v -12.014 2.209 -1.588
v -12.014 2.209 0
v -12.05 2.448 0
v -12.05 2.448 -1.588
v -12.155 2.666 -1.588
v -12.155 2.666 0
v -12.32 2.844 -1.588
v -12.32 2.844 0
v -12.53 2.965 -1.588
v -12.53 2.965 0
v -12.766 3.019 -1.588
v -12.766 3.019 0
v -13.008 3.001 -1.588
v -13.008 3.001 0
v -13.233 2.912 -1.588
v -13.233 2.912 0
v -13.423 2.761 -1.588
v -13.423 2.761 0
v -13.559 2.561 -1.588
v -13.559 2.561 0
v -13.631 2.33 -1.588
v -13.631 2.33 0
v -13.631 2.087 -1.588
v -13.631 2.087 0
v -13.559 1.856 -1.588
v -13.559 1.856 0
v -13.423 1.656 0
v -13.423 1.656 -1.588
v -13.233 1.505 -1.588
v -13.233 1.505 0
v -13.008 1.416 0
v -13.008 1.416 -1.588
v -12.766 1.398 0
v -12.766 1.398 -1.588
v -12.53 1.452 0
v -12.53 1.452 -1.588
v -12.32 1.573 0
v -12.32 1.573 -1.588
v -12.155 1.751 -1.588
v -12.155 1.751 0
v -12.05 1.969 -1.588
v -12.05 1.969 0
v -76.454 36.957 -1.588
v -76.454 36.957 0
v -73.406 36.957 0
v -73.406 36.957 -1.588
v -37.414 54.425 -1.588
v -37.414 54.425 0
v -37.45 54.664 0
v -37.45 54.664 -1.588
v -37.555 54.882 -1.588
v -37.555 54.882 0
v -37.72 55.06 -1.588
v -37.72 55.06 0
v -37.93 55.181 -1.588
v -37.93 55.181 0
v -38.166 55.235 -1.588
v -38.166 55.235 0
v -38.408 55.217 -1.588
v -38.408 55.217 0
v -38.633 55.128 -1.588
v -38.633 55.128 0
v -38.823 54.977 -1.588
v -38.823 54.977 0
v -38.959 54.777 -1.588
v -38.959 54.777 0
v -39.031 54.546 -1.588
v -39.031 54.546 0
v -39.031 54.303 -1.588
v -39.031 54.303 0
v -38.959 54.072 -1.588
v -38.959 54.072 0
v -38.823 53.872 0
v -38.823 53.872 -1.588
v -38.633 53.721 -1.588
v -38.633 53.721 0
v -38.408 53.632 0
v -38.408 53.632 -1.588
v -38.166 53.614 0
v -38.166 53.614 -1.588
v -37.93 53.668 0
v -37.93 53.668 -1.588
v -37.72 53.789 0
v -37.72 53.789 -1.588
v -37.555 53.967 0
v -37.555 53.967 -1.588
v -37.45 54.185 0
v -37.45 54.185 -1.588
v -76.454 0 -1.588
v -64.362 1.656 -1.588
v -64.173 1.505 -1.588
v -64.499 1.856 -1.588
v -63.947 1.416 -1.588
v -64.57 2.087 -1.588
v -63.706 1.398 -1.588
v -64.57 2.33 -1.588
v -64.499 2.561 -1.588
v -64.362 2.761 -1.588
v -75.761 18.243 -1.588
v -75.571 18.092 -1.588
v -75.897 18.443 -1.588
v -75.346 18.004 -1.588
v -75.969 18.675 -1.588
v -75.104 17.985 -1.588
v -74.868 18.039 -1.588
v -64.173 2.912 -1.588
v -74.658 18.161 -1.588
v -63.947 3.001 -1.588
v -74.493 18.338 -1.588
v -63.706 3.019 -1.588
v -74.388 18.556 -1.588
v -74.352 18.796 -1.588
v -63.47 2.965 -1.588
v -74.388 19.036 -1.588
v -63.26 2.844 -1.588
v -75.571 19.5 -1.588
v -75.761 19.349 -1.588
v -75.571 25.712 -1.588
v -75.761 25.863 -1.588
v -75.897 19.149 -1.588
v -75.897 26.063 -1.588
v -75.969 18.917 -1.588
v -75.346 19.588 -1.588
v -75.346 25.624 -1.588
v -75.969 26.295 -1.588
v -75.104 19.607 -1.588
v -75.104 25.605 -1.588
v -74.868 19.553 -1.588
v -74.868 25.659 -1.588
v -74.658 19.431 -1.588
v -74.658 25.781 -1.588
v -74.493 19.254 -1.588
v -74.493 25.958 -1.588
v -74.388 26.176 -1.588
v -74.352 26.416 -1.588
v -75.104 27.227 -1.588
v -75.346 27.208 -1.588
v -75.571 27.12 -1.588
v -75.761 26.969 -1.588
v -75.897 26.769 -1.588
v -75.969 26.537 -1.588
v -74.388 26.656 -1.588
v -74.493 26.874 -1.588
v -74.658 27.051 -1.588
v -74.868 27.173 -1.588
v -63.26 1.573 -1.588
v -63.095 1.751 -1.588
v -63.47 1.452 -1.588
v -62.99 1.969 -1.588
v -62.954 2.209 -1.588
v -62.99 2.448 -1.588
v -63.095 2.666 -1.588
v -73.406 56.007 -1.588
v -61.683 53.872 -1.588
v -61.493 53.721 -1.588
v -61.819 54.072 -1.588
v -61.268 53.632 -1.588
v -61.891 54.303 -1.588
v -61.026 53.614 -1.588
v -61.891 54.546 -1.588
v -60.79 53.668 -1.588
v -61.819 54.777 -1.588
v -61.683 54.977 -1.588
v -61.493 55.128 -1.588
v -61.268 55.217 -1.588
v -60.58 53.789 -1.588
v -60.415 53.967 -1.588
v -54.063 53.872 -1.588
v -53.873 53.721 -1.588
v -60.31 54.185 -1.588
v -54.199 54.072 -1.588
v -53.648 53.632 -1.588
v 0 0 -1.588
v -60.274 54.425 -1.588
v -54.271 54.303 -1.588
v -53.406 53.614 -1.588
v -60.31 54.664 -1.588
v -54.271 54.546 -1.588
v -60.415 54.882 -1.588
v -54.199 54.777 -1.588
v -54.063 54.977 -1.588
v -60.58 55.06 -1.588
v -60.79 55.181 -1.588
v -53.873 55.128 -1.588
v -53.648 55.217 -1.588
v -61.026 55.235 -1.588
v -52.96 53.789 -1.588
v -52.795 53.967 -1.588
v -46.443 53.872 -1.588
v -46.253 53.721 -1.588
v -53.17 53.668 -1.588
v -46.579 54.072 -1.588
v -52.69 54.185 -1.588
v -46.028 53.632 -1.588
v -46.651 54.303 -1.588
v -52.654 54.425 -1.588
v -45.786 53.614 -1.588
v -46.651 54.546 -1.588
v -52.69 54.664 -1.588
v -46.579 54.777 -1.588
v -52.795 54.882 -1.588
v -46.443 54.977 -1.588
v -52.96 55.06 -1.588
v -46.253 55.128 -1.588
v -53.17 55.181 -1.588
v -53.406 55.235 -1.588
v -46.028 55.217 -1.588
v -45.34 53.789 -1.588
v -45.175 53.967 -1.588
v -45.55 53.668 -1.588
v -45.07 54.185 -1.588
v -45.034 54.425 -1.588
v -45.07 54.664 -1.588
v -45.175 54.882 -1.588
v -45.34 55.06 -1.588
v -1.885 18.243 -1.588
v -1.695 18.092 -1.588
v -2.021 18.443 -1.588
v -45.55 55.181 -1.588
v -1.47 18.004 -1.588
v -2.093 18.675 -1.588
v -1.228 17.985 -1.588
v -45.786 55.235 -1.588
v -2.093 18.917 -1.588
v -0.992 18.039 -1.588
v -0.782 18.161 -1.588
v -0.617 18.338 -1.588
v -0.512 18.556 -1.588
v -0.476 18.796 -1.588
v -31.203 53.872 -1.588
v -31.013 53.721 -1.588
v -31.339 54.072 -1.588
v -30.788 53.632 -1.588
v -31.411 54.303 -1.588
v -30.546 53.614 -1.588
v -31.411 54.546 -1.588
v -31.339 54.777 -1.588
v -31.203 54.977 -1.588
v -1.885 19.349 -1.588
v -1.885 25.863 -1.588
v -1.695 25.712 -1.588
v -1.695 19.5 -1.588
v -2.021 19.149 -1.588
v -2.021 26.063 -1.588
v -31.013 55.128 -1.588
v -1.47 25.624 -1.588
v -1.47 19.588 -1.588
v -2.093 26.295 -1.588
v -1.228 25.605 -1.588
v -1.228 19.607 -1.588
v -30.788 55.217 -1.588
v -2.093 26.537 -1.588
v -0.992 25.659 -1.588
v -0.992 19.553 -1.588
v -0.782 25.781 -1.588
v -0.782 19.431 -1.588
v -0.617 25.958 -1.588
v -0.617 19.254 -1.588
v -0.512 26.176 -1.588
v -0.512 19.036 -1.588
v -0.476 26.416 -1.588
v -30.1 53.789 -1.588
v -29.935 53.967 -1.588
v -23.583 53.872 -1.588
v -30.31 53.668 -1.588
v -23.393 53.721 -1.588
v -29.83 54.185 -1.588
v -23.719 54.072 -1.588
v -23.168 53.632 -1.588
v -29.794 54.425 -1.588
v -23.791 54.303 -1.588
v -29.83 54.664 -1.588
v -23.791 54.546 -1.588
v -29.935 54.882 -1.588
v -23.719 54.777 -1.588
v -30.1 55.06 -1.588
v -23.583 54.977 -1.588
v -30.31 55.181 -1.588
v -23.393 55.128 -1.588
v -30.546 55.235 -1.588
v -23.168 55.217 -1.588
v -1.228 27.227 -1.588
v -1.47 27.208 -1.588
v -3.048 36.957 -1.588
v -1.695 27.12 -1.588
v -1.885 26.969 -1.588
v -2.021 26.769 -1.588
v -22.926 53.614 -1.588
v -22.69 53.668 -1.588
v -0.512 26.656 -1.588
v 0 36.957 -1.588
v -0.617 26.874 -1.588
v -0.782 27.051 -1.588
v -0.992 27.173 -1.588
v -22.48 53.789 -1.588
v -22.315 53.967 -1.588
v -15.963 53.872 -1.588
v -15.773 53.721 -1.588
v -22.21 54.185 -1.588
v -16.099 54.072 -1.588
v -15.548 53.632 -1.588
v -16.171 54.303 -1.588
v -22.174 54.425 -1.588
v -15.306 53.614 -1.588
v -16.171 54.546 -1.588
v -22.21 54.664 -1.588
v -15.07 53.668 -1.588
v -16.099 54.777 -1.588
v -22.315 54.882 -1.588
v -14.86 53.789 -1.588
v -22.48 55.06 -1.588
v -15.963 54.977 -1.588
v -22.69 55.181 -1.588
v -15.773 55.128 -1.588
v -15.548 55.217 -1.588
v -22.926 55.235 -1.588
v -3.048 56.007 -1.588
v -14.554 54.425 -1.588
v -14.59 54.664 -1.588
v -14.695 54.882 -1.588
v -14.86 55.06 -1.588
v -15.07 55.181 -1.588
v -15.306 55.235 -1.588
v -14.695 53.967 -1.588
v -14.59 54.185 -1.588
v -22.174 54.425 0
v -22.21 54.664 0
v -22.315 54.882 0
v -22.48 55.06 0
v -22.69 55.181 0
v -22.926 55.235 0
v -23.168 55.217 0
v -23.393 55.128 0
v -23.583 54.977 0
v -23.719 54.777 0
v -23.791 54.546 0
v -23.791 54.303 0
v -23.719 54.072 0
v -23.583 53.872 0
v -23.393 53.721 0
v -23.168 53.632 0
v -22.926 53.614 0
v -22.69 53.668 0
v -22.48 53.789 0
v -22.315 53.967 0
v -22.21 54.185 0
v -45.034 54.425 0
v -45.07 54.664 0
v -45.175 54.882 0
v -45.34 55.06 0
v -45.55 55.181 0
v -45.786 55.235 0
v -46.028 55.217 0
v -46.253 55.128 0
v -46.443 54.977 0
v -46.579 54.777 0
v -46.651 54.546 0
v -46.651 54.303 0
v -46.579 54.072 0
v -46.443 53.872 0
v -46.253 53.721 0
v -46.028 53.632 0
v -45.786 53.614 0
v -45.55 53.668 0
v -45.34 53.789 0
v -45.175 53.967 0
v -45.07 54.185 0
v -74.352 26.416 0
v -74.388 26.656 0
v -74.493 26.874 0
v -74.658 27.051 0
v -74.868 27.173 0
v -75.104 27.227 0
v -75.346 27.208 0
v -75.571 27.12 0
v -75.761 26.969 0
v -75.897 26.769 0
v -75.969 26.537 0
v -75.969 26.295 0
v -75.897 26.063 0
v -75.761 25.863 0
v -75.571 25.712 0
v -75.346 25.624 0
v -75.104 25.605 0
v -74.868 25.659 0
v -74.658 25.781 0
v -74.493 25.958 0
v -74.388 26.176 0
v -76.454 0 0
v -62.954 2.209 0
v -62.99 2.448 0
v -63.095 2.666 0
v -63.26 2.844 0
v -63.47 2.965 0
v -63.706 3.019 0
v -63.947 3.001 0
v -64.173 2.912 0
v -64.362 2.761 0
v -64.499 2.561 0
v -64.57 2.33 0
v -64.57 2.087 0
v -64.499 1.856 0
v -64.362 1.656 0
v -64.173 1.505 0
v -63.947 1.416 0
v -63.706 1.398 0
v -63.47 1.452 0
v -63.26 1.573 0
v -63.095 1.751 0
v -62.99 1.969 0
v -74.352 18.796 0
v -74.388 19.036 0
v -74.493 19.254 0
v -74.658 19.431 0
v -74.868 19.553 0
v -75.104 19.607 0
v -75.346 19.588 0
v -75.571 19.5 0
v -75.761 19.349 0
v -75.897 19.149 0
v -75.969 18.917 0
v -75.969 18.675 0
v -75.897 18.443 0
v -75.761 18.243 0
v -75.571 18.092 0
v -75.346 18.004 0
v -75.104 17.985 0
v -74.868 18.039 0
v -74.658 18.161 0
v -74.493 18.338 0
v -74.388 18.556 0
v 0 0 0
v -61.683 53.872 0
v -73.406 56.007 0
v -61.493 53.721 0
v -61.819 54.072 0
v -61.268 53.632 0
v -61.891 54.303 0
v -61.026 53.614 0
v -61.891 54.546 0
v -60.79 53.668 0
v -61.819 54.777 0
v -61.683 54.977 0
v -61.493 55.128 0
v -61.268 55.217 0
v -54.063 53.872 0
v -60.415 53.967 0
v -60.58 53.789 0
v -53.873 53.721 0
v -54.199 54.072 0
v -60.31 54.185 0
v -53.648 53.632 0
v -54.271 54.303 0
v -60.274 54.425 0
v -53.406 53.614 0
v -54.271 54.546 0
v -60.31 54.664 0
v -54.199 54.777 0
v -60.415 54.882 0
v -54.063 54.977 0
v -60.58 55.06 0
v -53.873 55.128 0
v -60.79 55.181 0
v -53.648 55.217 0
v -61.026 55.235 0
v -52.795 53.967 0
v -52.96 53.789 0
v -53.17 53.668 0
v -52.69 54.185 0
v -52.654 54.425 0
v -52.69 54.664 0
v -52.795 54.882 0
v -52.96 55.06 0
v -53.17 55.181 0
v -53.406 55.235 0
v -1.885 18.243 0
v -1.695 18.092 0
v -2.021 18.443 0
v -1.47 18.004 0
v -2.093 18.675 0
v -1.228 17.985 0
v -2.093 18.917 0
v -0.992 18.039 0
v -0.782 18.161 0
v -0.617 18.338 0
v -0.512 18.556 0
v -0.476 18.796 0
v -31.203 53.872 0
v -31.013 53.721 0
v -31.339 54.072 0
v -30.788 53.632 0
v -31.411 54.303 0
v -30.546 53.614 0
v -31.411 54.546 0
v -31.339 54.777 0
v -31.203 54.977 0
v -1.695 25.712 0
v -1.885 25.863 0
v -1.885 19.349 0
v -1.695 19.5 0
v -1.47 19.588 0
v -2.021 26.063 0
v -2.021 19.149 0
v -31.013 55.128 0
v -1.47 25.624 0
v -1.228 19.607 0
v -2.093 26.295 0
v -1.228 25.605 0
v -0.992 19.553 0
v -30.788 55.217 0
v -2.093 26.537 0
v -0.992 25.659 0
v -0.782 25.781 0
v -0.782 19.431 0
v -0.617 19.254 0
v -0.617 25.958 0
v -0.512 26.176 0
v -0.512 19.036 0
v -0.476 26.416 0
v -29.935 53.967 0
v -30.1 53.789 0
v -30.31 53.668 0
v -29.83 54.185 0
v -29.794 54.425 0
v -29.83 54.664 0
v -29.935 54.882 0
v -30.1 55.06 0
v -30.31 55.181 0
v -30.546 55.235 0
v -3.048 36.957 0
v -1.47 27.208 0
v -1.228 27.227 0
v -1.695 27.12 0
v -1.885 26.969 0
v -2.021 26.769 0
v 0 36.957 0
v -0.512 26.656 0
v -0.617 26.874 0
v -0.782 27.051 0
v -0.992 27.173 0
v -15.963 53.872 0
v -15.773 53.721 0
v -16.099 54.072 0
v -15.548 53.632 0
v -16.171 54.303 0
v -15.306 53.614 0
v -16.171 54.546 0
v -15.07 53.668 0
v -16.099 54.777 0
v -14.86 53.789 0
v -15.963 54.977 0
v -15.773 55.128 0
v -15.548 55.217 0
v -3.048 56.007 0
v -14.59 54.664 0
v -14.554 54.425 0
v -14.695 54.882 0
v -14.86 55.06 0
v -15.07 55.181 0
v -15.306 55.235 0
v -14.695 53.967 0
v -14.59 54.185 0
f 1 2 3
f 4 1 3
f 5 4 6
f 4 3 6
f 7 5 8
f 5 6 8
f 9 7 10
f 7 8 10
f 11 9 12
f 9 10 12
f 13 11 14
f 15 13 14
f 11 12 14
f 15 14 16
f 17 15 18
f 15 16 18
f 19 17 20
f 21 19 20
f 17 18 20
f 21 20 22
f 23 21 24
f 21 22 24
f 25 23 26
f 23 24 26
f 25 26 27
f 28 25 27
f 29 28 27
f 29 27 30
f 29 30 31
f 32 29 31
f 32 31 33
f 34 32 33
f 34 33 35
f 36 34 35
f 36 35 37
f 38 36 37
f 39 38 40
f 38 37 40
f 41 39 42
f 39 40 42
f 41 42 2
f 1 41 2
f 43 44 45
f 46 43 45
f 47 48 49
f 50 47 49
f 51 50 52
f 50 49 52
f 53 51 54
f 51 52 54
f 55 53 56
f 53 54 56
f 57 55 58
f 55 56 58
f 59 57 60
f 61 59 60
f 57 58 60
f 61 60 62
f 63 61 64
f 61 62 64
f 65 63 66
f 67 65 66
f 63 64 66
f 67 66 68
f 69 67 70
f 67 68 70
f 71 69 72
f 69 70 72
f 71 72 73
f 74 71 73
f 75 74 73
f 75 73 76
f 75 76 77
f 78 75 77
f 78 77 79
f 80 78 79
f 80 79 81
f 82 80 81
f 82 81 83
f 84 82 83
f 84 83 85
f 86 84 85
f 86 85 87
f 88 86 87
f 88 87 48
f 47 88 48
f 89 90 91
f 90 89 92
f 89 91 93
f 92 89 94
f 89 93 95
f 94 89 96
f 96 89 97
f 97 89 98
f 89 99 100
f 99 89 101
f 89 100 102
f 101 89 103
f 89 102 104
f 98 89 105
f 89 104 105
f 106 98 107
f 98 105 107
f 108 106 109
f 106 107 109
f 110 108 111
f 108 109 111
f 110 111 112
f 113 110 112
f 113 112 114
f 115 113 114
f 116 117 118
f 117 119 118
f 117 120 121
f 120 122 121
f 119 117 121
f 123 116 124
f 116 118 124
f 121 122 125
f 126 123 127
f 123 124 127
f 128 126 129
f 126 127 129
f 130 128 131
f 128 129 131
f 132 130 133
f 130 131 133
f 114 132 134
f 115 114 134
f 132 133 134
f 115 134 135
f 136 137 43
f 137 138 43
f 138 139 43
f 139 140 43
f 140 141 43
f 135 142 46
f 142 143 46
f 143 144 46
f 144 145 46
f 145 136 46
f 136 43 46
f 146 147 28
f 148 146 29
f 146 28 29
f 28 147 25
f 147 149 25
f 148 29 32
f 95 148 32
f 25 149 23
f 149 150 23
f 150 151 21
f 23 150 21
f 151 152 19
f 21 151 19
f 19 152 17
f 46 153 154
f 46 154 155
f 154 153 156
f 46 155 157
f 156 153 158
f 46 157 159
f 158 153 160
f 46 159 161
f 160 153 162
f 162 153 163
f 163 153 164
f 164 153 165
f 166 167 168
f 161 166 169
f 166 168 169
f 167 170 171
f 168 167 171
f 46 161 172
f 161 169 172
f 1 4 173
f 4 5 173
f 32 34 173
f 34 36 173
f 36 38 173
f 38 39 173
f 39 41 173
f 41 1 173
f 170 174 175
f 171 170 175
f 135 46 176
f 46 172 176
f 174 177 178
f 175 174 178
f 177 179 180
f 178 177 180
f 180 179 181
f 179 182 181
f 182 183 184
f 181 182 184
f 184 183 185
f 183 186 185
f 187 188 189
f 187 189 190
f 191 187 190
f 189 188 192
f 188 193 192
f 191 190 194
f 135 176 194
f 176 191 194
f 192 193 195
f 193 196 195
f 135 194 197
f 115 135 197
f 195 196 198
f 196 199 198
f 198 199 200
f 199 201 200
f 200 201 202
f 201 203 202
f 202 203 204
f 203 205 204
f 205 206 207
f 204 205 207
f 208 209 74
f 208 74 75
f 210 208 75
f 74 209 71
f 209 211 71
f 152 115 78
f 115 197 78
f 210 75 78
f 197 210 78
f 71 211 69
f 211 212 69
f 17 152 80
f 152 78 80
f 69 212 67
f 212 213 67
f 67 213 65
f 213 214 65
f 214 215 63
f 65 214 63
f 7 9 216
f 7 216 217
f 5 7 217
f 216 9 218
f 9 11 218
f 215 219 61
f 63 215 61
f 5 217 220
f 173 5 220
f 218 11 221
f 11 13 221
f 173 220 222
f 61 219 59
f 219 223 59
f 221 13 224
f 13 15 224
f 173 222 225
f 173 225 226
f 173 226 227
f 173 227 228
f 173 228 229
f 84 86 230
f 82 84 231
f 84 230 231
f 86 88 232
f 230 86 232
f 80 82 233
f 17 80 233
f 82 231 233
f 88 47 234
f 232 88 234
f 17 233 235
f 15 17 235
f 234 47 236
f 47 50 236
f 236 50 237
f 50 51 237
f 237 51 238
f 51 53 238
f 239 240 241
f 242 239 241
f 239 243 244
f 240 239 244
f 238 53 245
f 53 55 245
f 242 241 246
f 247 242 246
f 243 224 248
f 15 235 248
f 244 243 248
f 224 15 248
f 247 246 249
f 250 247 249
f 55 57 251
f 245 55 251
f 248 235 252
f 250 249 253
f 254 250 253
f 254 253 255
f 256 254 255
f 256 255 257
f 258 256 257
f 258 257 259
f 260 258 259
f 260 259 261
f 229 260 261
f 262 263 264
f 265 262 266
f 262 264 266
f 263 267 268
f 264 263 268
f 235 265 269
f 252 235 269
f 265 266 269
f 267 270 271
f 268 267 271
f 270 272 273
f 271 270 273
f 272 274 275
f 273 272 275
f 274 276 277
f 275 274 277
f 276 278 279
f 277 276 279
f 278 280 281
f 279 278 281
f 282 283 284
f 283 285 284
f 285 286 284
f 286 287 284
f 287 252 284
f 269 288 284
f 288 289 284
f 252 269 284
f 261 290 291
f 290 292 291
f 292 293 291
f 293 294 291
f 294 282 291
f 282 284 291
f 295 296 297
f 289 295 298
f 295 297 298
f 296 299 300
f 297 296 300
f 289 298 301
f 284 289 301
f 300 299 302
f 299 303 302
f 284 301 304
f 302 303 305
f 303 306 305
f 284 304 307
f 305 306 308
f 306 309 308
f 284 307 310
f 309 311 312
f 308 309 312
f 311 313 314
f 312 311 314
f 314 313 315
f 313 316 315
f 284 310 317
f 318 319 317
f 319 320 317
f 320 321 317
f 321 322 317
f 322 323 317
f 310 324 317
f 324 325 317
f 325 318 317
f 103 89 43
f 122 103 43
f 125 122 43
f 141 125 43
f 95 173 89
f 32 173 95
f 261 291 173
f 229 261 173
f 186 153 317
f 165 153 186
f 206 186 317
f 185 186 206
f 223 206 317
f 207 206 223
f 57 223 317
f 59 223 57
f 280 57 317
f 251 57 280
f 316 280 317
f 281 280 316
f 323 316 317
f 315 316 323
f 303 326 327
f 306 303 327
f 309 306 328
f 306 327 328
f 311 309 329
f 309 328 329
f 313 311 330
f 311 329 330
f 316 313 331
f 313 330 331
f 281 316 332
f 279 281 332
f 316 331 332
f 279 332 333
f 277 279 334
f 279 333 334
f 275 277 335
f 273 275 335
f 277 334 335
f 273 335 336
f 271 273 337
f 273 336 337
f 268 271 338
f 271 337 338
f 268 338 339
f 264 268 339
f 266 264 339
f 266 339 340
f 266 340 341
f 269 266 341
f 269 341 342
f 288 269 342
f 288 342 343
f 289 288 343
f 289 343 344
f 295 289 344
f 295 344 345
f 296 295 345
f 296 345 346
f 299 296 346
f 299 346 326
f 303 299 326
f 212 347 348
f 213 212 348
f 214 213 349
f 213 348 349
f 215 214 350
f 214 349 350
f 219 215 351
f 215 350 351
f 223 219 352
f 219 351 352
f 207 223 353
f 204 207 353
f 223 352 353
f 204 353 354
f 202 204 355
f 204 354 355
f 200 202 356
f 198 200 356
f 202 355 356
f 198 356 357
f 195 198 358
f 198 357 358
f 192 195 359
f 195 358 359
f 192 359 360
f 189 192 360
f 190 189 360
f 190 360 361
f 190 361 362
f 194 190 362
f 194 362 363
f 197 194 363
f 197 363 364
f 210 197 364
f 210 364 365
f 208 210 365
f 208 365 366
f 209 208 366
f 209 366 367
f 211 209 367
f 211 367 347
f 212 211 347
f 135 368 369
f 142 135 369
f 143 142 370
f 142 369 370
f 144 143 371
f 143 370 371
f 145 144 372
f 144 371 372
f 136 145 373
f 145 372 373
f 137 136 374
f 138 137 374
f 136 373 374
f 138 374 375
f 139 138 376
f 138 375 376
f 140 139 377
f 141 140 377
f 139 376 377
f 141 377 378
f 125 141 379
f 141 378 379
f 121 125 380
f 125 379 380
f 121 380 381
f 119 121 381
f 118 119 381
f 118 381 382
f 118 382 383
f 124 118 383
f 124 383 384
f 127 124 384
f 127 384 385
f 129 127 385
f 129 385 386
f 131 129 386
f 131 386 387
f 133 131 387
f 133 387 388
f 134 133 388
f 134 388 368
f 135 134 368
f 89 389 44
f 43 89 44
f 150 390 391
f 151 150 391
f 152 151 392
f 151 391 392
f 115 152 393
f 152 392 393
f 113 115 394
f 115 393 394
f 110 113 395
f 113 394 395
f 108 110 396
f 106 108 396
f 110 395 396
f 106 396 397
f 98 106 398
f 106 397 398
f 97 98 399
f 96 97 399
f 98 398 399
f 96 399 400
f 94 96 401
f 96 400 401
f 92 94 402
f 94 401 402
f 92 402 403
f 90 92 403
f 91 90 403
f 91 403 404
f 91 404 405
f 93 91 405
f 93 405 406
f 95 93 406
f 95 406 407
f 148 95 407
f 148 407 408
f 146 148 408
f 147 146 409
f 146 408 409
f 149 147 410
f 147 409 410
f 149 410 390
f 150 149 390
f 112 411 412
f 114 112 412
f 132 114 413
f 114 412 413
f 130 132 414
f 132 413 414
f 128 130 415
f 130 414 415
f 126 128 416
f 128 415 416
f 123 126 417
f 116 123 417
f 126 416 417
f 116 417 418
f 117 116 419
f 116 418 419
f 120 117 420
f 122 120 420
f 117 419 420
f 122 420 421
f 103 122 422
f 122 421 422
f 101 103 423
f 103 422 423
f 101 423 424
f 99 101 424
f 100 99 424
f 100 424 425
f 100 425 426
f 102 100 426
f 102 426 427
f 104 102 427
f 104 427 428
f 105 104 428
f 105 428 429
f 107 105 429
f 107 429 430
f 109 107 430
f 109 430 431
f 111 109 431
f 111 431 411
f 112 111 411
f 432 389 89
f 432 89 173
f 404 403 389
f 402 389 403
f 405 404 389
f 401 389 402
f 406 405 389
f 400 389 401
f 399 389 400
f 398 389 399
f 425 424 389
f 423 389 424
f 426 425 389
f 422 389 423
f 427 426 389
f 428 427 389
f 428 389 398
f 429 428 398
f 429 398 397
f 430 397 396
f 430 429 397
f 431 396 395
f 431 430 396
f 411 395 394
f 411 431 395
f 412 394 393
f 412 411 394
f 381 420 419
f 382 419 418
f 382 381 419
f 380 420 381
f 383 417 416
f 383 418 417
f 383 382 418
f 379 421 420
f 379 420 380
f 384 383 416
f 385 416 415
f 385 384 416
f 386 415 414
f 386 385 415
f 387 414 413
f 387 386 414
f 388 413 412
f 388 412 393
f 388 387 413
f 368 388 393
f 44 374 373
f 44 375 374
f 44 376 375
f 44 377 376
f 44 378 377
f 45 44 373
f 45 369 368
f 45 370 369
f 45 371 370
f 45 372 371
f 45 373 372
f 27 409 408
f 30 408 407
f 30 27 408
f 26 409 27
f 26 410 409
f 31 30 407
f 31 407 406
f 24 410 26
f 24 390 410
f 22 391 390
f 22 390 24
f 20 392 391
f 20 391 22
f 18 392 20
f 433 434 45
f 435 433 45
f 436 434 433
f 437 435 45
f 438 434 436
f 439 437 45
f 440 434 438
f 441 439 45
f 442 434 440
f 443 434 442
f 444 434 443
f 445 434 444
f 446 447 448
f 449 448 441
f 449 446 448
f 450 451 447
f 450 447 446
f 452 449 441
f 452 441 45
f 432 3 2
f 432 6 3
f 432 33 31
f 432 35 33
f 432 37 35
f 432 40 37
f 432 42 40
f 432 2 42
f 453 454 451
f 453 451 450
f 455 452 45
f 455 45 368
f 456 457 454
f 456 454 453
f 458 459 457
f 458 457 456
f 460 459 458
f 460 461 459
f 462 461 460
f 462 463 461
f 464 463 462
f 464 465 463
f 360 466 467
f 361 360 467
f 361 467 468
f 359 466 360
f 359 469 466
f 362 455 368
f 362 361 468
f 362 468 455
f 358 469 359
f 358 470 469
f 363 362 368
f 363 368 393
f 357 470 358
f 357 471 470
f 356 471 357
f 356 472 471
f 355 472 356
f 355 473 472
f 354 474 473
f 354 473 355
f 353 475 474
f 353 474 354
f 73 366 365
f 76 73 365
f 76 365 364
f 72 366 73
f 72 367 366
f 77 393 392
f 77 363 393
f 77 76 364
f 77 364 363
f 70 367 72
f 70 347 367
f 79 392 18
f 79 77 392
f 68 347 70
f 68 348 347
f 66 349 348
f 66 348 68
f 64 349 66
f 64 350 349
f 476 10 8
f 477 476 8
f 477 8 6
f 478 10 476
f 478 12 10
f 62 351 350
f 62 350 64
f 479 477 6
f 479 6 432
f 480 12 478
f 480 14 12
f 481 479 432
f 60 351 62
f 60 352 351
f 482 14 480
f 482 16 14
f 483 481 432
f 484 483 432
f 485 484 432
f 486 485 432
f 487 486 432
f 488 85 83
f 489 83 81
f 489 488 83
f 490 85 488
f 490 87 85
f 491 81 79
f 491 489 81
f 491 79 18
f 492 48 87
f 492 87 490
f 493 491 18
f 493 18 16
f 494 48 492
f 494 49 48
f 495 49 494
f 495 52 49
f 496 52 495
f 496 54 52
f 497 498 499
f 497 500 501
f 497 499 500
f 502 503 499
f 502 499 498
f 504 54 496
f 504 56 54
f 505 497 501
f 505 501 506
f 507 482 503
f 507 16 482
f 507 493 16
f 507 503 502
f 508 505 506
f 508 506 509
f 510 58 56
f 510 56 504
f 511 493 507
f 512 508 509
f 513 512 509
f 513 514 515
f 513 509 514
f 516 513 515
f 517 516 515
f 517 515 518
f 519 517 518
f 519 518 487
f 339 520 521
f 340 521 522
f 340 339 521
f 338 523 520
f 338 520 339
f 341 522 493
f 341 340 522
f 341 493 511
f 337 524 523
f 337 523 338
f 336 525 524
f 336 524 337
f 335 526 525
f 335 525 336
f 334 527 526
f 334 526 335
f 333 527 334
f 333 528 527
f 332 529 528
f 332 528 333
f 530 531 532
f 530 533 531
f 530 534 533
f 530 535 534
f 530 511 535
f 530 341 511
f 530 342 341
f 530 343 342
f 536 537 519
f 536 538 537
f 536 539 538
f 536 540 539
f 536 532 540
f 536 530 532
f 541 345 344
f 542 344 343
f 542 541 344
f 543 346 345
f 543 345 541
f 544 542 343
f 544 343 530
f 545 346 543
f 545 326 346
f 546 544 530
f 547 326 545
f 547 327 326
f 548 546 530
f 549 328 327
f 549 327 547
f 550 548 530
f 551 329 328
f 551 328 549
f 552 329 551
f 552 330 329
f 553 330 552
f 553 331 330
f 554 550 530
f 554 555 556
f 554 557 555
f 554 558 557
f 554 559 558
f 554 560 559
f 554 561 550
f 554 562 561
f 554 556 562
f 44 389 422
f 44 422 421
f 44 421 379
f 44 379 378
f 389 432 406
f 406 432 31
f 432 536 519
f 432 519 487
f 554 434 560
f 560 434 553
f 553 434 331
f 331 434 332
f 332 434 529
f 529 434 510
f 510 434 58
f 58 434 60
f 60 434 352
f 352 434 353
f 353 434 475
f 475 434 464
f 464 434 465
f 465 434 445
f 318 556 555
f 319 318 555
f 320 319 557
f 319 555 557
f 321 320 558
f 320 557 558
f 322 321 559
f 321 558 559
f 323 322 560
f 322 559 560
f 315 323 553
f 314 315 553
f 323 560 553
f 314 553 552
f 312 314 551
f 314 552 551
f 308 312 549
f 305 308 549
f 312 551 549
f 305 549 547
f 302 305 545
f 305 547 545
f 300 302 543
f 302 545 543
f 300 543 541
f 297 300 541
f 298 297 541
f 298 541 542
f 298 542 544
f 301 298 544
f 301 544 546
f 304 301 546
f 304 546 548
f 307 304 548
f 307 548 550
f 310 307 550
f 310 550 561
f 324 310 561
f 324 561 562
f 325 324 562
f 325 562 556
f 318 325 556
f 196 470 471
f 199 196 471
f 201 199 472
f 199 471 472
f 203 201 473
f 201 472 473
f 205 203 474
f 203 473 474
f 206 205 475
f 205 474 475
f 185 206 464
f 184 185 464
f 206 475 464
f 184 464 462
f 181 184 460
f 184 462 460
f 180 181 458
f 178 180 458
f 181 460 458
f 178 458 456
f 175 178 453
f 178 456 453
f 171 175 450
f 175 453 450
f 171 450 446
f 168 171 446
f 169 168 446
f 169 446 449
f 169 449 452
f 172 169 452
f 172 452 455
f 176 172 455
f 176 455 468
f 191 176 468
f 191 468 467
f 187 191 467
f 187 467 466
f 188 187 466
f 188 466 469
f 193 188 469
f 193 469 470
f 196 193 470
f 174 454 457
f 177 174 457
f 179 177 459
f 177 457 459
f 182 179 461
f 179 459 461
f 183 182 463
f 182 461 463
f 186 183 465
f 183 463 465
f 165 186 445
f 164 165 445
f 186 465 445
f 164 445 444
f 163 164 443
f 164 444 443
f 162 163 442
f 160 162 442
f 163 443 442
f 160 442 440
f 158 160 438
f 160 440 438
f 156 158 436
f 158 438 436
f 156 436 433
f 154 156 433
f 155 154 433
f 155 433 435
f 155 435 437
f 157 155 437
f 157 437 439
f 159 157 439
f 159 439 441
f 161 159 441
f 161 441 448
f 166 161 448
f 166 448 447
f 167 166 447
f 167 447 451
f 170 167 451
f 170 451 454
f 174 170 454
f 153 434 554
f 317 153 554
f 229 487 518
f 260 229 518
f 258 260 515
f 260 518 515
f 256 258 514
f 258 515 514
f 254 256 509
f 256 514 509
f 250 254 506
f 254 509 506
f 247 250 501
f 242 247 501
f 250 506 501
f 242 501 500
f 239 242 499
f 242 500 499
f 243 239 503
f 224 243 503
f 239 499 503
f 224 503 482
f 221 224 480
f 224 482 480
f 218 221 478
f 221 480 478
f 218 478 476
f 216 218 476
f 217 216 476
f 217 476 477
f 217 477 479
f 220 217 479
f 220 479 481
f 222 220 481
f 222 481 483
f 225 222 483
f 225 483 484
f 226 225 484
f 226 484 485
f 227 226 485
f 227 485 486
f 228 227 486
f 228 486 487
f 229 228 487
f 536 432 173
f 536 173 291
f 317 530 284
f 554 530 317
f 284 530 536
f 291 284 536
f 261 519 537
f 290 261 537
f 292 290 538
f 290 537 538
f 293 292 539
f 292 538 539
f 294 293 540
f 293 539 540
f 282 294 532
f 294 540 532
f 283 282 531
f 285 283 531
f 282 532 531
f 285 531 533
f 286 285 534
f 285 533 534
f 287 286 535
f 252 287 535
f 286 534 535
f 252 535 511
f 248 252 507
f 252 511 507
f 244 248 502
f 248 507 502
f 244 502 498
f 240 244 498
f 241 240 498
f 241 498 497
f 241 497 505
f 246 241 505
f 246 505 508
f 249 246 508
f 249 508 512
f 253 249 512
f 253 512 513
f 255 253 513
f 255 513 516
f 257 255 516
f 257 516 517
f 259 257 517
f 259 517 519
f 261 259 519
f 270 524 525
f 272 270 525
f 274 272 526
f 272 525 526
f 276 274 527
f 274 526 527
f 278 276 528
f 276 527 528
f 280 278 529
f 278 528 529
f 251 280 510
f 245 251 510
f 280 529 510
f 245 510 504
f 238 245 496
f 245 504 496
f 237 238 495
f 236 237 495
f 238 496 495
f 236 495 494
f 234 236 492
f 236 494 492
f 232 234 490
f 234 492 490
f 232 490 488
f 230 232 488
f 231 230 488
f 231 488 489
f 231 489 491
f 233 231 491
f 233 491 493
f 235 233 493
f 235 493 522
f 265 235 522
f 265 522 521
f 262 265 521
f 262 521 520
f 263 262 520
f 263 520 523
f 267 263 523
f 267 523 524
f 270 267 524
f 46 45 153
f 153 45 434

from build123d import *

# Parameters (mm, degrees)
SKETCH1_W          = 76.454
SKETCH1_H          = 56.007
EXTRUDE1_DEPTH     = 1.5875
SKETCH2_R          = 0.8128
EXTRUDE2_DEPTH     = 95.786699073
SKETCH4_R          = 0.8128
EXTRUDE3_DEPTH     = 9.525
SKETCH5_W          = 3.048
SKETCH5_H          = 19.05
EXTRUDE4_DEPTH     = 95.786699073
SKETCH6_R          = 0.8128
CUT_EXTRUDE1_DEPTH = 1.5875


with BuildPart() as part:
    # Sketch1 → Extrude1 (new body)
    with BuildSketch(Plane.XY):
        with Locations((-38.227, 28.0035)):
            Rectangle(SKETCH1_W, SKETCH1_H)
    extrude(amount=-EXTRUDE1_DEPTH)

    # Sketch2 → Extrude2 (cut, through all)
    with BuildSketch(Plane.XY):
        with Locations((-38.227, 54.42458)):
            Circle(SKETCH2_R)
        with Locations((-30.607, 54.42458)):
            Circle(SKETCH2_R)
        with Locations((-22.987, 54.42458)):
            Circle(SKETCH2_R)
        with Locations((-15.367, 54.42458)):
            Circle(SKETCH2_R)
        with Locations((-45.847, 54.42458)):
            Circle(SKETCH2_R)
        with Locations((-53.467, 54.42458)):
            Circle(SKETCH2_R)
        with Locations((-61.087, 54.42458)):
            Circle(SKETCH2_R)
    extrude(amount=-EXTRUDE2_DEPTH, mode=Mode.SUBTRACT)

    # Sketch4 → Extrude3 (cut)
    with BuildSketch(Plane.XY):
        with Locations((-75.16495, 26.416)):
            Circle(SKETCH4_R)
        with Locations((-75.16495, 18.796)):
            Circle(SKETCH4_R)
        with Locations((-1.28905, 26.416)):
            Circle(SKETCH4_R)
        with Locations((-1.28905, 18.796)):
            Circle(SKETCH4_R)
    extrude(amount=-EXTRUDE3_DEPTH, mode=Mode.SUBTRACT)

    # Sketch5 → Extrude4 (cut, through all)
    with BuildSketch(Plane.XY):
        with Locations((-74.93, 46.482)):
            Rectangle(SKETCH5_W, SKETCH5_H)
        with Locations((-1.524, 46.482)):
            Rectangle(SKETCH5_W, SKETCH5_H)
    extrude(amount=-EXTRUDE4_DEPTH, mode=Mode.SUBTRACT)

    # Sketch6 → Cut-Extrude1 (cut)
    with BuildSketch(Plane.XY):
        with Locations((-12.827, 2.20853)):
            Circle(SKETCH6_R)
        with Locations((-63.766480146, 2.20853)):
            Circle(SKETCH6_R)
    extrude(amount=-CUT_EXTRUDE1_DEPTH, mode=Mode.SUBTRACT)


solid = part.part
